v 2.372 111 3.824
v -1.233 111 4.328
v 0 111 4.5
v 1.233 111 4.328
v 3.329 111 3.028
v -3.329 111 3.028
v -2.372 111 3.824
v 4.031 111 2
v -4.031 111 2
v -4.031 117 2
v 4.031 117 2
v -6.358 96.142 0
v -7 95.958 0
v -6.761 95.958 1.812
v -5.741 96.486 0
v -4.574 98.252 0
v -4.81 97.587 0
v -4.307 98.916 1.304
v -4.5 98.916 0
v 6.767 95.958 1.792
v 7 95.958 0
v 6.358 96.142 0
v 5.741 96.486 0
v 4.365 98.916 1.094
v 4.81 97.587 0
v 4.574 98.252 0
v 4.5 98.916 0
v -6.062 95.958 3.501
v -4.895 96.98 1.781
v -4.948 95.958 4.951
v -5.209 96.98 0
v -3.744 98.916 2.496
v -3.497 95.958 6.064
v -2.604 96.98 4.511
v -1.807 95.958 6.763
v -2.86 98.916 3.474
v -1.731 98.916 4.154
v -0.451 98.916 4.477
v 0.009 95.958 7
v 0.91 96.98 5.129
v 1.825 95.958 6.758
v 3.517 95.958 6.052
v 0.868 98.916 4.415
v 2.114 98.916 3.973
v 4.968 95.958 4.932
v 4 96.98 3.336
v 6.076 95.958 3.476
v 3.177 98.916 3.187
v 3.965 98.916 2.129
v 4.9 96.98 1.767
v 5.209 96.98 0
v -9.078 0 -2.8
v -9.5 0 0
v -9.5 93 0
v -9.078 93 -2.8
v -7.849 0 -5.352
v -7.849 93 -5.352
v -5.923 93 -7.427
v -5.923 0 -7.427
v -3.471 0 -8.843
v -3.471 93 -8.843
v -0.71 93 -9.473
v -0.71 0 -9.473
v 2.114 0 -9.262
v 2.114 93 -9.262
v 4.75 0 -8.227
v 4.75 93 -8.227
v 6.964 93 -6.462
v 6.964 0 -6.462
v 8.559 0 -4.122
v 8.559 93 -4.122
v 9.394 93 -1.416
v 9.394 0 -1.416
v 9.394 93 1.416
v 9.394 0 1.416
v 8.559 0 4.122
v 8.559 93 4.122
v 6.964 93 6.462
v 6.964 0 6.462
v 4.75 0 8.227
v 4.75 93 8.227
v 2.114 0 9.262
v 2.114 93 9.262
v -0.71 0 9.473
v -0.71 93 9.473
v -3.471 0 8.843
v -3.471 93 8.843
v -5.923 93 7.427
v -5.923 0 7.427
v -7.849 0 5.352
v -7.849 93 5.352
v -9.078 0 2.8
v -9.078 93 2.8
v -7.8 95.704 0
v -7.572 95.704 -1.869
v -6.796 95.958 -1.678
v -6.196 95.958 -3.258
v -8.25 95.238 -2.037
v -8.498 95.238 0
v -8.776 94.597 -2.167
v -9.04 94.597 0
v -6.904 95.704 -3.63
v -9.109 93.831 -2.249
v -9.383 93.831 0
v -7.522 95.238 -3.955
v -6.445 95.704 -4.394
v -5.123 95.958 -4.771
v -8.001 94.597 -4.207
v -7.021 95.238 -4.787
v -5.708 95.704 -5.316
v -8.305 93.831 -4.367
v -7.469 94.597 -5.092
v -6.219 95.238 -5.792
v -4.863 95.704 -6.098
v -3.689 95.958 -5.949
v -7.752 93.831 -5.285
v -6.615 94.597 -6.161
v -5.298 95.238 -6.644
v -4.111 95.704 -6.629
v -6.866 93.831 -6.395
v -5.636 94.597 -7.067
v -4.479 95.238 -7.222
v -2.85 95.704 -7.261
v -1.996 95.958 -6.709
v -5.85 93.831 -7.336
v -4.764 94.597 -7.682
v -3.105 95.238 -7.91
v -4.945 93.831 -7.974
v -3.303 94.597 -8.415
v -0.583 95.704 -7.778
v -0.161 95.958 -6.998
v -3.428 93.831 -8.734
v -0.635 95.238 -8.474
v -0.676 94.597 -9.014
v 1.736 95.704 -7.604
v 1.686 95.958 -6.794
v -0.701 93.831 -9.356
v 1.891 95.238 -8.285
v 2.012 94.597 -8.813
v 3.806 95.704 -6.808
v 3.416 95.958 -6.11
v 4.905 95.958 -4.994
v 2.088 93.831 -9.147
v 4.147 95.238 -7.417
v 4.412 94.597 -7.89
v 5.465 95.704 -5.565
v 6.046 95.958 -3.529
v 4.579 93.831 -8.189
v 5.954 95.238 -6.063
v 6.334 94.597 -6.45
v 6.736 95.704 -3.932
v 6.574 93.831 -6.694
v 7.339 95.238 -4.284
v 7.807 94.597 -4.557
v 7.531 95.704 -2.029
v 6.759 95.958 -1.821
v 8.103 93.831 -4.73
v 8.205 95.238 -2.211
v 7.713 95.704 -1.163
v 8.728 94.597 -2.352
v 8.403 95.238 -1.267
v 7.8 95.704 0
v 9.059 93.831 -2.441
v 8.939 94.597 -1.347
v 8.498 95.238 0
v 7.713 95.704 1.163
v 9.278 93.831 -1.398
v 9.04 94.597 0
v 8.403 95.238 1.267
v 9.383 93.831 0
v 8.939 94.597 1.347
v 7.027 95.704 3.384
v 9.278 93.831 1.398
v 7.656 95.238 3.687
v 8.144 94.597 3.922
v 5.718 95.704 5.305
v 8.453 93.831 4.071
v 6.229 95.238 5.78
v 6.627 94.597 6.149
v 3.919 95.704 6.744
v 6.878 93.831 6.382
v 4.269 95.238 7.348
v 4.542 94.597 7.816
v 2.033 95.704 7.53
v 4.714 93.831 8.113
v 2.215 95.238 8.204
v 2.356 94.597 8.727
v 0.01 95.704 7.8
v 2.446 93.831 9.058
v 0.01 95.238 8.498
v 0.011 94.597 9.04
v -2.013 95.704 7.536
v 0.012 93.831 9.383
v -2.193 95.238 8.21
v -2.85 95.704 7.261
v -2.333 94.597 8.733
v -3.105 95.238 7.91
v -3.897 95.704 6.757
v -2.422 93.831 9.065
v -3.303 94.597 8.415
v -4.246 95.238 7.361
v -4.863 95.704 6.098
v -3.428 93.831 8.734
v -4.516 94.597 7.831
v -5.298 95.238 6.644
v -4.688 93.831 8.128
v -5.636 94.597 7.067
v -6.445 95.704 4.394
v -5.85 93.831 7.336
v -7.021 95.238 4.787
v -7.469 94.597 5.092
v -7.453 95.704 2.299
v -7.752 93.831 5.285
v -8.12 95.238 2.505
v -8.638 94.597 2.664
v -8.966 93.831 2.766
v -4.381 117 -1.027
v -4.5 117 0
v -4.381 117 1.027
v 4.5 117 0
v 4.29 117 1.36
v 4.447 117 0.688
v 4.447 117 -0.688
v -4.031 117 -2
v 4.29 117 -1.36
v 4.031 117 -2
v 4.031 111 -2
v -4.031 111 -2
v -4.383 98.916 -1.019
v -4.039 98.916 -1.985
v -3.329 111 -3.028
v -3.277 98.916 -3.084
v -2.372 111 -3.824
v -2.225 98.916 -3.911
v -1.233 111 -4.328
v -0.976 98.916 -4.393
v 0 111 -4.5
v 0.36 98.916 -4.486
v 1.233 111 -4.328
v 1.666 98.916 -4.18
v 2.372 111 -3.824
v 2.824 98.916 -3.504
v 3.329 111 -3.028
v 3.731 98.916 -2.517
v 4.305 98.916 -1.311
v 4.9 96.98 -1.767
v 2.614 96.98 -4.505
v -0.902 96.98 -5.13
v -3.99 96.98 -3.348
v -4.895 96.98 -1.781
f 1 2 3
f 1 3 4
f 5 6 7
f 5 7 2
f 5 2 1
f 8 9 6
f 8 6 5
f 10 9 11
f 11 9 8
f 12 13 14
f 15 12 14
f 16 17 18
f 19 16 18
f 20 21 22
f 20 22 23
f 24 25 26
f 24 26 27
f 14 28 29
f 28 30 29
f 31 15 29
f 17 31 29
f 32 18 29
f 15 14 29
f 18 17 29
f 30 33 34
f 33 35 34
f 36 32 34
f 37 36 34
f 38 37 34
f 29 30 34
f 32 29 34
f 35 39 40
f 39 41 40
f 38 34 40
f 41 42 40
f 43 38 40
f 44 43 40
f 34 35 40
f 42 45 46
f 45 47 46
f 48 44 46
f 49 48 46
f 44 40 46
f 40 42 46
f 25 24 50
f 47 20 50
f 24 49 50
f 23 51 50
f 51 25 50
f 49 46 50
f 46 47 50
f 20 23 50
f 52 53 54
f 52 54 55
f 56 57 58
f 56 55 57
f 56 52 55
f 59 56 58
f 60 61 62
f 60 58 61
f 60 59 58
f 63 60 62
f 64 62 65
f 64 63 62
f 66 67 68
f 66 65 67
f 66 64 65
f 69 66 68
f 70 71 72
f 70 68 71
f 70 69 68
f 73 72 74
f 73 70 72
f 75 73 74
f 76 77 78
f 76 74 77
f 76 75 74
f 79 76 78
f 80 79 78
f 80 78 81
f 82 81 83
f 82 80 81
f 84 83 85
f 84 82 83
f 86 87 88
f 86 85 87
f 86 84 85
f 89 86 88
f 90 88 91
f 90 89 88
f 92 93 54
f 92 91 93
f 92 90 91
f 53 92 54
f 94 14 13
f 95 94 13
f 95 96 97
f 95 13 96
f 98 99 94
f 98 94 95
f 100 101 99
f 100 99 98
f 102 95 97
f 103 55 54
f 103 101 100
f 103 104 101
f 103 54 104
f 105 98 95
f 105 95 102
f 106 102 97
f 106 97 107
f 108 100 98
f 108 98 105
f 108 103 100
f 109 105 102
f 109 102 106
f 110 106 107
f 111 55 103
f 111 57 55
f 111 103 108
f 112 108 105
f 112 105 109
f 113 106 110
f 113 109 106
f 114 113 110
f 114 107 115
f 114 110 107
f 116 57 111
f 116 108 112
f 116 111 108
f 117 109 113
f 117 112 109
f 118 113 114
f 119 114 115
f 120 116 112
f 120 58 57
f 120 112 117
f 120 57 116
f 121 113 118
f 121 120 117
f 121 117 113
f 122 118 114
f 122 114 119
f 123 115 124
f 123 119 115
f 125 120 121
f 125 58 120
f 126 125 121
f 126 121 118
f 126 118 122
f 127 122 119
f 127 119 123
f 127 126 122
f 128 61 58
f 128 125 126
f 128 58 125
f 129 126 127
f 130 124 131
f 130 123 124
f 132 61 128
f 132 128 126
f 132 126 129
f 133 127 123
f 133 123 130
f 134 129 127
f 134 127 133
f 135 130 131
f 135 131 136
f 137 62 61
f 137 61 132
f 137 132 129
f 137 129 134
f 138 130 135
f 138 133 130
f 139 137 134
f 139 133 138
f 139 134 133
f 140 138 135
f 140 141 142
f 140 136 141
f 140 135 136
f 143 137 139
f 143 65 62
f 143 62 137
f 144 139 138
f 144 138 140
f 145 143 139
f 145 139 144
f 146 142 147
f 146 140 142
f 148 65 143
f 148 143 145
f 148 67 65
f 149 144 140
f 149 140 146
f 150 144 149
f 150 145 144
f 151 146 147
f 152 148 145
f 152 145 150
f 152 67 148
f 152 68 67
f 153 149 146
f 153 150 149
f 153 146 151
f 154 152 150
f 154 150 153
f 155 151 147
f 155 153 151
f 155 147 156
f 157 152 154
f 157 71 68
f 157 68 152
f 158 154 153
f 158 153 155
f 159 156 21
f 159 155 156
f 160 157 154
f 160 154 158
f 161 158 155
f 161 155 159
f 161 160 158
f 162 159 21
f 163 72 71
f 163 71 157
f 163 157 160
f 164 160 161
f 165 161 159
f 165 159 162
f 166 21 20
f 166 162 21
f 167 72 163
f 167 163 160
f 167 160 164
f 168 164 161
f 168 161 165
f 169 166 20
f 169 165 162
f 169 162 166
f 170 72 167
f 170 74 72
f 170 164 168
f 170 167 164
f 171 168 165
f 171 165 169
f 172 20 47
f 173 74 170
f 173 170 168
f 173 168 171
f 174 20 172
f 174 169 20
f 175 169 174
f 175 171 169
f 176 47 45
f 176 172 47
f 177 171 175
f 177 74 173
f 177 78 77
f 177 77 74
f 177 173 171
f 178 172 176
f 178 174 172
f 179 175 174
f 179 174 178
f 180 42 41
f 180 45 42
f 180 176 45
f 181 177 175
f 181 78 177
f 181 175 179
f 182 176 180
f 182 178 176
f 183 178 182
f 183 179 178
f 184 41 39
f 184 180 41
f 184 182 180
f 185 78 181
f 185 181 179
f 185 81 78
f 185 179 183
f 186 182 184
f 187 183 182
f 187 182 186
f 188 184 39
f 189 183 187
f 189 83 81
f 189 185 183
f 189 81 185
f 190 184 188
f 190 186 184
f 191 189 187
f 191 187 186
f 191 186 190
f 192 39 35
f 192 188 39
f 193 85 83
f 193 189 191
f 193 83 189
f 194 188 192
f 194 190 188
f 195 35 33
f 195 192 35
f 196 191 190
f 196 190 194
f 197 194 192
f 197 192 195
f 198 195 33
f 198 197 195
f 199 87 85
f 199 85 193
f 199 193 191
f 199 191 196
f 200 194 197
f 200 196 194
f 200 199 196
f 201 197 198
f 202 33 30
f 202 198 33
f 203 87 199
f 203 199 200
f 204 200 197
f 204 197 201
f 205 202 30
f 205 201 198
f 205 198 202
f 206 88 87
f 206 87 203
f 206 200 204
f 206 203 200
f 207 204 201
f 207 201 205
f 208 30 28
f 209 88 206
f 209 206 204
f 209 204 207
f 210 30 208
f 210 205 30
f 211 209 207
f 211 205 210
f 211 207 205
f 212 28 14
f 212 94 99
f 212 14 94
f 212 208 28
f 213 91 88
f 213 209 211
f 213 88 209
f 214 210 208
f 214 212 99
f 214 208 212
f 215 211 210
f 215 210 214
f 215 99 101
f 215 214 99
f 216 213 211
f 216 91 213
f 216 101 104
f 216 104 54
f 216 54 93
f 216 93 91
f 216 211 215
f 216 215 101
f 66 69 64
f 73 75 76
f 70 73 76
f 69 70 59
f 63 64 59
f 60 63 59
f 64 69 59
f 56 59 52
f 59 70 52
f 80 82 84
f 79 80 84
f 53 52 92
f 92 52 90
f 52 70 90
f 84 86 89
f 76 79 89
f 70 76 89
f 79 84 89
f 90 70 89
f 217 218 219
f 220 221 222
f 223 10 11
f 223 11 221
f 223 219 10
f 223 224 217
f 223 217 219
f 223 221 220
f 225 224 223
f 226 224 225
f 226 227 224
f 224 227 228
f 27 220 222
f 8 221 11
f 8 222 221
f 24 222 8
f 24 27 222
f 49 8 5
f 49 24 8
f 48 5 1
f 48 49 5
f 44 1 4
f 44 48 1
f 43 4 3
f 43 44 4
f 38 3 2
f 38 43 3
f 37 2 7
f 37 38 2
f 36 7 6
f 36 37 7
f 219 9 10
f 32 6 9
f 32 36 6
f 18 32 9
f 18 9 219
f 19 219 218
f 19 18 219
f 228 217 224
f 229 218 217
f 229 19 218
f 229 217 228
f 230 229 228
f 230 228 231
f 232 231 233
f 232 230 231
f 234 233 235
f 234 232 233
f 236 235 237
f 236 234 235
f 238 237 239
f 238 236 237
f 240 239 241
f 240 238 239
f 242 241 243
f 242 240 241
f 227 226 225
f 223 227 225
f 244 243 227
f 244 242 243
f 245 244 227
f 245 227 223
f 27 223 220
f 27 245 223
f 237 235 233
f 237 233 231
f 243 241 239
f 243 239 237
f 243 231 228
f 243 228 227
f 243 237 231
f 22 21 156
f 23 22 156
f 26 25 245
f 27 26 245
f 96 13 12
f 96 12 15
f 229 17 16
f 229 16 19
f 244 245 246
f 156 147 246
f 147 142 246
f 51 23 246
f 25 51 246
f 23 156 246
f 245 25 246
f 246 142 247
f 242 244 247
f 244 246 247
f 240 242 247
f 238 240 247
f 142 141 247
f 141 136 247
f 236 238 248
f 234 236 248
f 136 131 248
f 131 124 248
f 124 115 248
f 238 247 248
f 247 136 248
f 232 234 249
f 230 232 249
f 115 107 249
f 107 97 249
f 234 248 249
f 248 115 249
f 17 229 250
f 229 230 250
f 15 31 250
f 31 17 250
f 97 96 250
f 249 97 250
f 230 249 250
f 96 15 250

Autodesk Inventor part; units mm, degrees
ref_plane "YZ Plane" through (0, 0, 0) normal (1, 0, 0) x (0, 1, 0)
ref_plane "XZ Plane" through (0, 0, 0) normal (0, 1, 0) x (-1, 0, 0)
ref_plane "XY Plane" through (0, 0, 0) normal (0, 0, 1) x (1, 0, 0)
sketch "Sketch1" plane through (0, 0, 0) normal (0, 1, 0) x (-1, 0, 0)
  circle A0 centre (0, 0) radius 9.5
  dimension "d0" = 19
extrude "Extrusion1" add sketch "Sketch1" along normal blind 96
sketch "Sketch2" plane through (0, 96, 0) normal (0, 1, 0) x (1, 0, 0)
  circle A0 centre (0, 0) radius 4.5
  dimension "d3" = 9
extrude "Extrusion2" add sketch "Sketch2" along normal blind 15
sketch "Sketch3" plane through (0, 111, 0) normal (0, 1, 0) x (1, 0, 0)
  circle A0 centre (0, 0) radius 4.5 projected
  line L0 (-4.5, -2) -> (4.5, -2)
  line L1 (4.5, -2) -> (4.5, 2)
  line L2 (4.5, 2) -> (-4.5, 2)
  line L3 (-4.5, 2) -> (-4.5, -2)
  point P0 (-4.5, 0)
  point P1 (0, 2)
  point P2 (4.0311, 2)
  point P3 (-4.0311, 2)
  point P4 (-4.0311, -2)
  point P5 (4.0311, -2)
  dimension "d6" = 4
extrude "Extrusion3" add sketch "Sketch3" along normal blind 6 contours A0 L0 L2
fillet "Fillet1" radius 3 2 edges at (9.5, 96, 0) (-4.5, 96, 0)
properties part number "Marker" material "PC/ABS Plastic"
